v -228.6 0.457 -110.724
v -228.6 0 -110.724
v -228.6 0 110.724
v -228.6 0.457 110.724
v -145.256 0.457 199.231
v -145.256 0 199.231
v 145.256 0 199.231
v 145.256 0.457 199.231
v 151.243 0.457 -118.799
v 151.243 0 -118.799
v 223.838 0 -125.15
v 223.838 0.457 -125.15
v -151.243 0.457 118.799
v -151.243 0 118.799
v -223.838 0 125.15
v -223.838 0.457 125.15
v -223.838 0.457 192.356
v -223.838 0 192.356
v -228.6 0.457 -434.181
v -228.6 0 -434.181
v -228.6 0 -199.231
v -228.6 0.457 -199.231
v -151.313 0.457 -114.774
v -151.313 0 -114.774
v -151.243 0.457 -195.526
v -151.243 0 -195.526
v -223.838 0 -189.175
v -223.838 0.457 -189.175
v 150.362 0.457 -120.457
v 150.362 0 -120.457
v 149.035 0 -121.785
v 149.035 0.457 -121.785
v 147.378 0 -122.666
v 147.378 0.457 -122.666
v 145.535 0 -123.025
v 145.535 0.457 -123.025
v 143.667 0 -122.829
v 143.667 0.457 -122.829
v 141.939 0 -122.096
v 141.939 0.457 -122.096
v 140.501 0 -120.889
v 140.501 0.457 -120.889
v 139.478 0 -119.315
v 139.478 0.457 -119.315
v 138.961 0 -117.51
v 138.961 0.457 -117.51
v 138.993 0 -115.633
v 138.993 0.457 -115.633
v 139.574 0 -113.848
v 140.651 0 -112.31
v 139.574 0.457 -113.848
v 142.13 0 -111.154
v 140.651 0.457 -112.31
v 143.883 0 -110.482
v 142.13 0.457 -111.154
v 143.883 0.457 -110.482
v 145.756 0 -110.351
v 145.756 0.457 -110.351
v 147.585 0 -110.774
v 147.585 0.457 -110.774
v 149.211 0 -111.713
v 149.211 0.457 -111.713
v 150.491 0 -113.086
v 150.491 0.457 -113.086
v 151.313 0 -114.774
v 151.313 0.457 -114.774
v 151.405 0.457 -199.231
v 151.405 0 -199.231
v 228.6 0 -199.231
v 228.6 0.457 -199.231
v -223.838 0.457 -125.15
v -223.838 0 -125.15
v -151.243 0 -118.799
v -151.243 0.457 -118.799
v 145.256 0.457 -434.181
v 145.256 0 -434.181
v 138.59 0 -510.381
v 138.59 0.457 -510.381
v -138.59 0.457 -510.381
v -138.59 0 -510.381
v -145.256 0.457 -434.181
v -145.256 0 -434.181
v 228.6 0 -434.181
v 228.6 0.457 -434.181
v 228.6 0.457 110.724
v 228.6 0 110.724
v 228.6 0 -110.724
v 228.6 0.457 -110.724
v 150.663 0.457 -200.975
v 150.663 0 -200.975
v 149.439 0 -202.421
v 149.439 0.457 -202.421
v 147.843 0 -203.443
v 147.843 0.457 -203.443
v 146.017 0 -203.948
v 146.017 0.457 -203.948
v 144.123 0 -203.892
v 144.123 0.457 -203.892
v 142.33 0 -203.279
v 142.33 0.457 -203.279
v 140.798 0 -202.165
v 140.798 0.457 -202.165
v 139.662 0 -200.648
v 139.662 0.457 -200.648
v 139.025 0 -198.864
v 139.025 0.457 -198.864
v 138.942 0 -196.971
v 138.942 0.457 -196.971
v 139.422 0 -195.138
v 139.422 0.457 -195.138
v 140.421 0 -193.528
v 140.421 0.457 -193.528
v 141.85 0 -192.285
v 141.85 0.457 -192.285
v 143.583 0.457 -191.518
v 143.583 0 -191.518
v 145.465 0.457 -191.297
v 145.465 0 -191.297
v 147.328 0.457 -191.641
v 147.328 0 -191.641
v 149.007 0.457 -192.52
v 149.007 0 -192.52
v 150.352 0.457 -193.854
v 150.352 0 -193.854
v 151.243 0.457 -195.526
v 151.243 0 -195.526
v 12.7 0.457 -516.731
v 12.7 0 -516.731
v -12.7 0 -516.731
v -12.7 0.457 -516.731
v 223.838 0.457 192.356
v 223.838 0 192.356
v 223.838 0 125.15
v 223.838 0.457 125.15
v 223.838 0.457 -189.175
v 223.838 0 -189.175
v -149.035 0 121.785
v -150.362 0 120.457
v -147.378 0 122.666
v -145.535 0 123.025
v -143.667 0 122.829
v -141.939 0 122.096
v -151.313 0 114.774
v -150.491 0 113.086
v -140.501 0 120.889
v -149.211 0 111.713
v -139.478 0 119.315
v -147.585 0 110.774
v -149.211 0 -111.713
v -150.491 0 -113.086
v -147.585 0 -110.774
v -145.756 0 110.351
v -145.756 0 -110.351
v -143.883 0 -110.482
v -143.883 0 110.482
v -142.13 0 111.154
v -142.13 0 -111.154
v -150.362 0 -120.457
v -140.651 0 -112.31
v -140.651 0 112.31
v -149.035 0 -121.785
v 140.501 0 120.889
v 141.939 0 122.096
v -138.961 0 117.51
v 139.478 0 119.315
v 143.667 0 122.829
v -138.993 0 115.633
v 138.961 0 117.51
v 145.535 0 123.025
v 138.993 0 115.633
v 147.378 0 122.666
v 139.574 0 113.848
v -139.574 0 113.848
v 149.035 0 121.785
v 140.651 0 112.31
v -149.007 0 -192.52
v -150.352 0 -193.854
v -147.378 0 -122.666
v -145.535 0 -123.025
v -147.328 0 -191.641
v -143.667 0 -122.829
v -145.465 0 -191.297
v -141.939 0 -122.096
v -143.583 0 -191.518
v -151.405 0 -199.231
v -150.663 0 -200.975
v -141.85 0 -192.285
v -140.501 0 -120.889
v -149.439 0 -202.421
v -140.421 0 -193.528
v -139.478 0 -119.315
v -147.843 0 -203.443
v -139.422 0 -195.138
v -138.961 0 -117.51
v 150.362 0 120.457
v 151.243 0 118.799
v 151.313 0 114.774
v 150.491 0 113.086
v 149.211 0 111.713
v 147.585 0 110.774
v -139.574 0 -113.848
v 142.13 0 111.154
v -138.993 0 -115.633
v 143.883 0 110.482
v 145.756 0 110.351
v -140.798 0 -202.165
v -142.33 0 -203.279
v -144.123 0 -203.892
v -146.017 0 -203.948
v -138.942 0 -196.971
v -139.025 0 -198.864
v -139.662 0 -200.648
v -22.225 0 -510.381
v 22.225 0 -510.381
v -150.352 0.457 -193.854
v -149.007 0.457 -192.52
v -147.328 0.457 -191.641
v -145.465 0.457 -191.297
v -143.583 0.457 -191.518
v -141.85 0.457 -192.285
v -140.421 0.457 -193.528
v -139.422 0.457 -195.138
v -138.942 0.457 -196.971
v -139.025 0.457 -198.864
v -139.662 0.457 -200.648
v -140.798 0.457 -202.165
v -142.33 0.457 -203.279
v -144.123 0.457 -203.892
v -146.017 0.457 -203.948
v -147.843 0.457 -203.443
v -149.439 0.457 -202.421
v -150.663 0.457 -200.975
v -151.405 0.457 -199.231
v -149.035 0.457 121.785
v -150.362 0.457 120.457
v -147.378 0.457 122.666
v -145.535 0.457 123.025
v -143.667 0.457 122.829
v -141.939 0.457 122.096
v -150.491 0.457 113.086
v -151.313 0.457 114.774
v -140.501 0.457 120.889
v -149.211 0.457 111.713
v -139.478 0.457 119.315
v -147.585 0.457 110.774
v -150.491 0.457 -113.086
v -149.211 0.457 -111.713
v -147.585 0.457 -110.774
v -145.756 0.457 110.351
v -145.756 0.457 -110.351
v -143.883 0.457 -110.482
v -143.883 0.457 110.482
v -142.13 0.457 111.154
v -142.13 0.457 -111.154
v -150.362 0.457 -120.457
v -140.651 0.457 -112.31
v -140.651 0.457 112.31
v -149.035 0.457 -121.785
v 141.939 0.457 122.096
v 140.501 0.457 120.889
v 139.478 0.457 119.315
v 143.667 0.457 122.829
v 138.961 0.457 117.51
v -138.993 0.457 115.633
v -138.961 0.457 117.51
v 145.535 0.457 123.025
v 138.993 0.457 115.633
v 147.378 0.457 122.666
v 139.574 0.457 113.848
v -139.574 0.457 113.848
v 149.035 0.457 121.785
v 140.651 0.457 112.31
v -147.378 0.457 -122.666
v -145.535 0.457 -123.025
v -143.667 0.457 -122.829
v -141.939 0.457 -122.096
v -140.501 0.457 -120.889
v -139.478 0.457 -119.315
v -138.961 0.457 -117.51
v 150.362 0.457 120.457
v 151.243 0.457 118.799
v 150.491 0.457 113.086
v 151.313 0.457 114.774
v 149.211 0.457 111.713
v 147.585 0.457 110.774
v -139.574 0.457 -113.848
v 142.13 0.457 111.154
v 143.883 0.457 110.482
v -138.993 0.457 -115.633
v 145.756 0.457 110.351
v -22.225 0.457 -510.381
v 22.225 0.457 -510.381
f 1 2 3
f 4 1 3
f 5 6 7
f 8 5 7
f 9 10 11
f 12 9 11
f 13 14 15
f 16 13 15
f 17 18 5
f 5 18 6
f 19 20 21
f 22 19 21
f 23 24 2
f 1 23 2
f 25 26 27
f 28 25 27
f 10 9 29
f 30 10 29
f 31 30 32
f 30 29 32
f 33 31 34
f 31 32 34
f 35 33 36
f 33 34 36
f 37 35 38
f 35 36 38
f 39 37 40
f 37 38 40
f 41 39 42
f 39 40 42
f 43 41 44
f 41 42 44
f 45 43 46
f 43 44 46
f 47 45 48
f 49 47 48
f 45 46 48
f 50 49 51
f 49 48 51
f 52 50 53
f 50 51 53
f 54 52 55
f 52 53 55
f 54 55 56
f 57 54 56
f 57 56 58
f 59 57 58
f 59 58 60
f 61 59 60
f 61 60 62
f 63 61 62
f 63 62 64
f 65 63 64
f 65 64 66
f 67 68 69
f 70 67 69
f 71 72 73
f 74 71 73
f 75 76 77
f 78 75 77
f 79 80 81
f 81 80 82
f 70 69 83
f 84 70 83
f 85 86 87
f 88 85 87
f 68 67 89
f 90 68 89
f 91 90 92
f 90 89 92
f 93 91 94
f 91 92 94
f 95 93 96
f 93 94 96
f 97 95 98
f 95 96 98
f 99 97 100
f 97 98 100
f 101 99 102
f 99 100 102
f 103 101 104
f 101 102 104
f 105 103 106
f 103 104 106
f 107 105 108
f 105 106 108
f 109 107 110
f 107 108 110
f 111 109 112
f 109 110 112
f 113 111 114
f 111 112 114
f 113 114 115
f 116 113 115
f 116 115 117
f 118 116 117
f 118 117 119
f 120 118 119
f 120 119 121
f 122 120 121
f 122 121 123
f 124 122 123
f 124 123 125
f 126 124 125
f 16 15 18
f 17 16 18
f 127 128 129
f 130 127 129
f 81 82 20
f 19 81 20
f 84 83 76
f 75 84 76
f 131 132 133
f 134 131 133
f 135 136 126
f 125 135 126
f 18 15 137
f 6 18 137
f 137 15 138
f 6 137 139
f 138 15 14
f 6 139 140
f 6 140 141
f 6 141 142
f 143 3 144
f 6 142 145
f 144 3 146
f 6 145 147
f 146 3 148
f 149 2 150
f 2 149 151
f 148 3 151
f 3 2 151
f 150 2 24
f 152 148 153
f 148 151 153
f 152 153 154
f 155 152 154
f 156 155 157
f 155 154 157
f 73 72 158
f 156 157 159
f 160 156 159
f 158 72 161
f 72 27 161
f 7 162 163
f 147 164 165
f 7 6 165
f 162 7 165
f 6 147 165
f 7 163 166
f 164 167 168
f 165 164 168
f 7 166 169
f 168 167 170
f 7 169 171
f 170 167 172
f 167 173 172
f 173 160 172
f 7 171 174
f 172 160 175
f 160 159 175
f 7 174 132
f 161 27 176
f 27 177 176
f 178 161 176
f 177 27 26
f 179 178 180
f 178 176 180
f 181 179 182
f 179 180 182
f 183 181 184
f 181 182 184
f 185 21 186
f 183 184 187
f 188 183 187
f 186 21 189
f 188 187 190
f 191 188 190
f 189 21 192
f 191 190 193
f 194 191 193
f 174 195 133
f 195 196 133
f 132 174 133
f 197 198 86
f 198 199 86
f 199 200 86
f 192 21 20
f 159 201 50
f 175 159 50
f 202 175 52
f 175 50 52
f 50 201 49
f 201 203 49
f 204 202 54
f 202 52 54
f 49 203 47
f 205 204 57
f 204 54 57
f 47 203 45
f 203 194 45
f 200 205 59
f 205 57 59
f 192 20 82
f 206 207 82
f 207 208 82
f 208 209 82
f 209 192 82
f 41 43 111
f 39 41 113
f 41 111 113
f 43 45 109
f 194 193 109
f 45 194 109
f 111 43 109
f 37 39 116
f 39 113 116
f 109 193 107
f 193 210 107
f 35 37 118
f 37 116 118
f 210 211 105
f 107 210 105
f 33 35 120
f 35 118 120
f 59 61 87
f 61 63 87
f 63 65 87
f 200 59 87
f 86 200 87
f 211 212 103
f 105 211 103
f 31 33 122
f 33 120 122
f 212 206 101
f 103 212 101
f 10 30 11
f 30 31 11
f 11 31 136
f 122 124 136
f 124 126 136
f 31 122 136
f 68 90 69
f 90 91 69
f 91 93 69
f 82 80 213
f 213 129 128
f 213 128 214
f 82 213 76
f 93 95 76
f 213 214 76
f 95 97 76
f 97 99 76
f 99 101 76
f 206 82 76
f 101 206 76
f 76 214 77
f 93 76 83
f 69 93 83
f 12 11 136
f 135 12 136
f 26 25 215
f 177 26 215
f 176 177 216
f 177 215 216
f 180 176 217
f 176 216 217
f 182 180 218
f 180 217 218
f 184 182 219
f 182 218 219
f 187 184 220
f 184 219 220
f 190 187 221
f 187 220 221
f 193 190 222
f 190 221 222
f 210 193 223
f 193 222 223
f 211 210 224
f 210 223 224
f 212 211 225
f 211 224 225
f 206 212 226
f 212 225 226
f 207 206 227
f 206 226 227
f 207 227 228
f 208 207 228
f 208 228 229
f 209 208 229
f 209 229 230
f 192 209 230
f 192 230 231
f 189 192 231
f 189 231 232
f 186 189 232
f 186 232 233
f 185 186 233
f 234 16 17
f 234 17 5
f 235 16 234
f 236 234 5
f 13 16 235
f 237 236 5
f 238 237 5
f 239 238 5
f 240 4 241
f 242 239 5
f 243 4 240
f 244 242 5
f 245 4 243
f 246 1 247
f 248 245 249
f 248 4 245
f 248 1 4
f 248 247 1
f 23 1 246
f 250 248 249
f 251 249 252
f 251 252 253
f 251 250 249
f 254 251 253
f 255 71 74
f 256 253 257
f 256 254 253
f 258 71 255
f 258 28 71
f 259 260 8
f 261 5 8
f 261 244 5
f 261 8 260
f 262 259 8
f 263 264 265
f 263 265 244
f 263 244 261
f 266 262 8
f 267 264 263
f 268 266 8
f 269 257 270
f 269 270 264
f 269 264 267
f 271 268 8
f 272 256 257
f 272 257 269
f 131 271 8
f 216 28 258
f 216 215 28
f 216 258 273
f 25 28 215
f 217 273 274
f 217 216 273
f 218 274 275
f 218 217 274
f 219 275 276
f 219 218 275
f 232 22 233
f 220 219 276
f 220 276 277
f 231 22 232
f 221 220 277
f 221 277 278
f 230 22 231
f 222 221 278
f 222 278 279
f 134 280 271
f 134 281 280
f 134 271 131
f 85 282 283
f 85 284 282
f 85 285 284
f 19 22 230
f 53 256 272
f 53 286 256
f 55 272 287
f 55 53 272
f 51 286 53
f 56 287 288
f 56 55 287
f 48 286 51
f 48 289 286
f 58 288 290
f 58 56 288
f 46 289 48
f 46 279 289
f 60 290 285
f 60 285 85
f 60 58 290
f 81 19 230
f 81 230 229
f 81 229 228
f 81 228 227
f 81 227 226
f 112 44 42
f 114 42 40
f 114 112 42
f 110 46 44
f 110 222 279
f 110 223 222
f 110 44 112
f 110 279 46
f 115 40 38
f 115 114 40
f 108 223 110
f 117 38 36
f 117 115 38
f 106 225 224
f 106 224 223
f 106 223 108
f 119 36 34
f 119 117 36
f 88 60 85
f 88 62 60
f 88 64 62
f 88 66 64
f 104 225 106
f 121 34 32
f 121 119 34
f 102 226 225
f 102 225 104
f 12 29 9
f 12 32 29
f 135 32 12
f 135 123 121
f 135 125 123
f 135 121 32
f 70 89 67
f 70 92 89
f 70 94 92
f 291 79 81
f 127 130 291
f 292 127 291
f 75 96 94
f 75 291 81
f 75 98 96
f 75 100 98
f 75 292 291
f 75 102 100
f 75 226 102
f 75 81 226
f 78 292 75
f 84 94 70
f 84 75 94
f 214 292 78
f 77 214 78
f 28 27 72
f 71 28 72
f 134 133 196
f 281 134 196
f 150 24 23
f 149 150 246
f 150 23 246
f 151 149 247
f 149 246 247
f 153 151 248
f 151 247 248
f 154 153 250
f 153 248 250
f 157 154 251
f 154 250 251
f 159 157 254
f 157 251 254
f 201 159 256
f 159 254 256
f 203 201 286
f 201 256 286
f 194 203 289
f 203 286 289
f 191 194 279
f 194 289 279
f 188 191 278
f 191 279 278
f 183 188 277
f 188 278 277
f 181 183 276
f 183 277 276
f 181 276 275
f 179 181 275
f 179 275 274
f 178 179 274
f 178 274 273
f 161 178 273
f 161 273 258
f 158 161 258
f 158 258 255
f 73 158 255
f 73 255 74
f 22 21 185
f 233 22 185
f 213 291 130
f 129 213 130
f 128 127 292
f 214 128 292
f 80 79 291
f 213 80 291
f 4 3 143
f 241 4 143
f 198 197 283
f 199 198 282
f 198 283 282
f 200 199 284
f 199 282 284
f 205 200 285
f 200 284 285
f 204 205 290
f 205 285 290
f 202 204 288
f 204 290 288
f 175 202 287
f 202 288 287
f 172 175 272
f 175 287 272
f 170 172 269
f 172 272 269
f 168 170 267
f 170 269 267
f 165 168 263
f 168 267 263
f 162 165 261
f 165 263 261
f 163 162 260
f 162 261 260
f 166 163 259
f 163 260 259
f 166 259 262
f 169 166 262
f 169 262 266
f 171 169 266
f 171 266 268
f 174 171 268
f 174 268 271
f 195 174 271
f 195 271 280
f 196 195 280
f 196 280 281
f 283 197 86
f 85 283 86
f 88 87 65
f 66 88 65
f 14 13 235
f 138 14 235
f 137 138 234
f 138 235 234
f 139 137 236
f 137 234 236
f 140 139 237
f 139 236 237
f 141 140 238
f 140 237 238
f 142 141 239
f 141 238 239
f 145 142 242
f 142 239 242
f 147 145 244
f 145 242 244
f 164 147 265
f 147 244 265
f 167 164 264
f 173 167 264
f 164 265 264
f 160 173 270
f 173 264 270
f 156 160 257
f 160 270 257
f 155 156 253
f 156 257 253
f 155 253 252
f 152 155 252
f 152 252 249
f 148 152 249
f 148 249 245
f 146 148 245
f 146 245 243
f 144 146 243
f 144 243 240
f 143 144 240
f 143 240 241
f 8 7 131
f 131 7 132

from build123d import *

# Parameters (mm, degrees)
EXTRUDE1_DEPTH = 0.4572
EXTRUDE2_REACH = 567.039
SKETCH2_R      = 6.35
EXTRUDE3_REACH = 567.039


with BuildPart() as part:
    # Sketch1 → Extrude1 (new body)
    with BuildSketch(Plane(origin=(0, 0, 0), x_dir=(1, 0, 0), z_dir=(0, 1, 0))):
        with BuildLine():
            Line((145.25625, 434.18125), (138.034060826, 516.73125))
            Line((138.034060826, 516.73125), (-138.034060826, 516.73125))
            Line((-138.034060826, 516.73125), (-145.25625, 434.18125))
            Line((-145.25625, 434.18125), (-228.6, 434.18125))
            Line((-228.6, 434.18125), (-228.6, 199.23125))
            Line((-228.6, 199.23125), (-145.25625, 199.23125))
            ThreePointArc((-145.25625, 199.23125), (-143.670260948, 197.712995777), (-145.117890258, 196.062290917))
            Line((-145.117890258, 196.062290917), (-223.8375, 189.175217467))
            Line((-223.8375, 189.175217467), (-223.8375, 125.149782533))
            Line((-223.8375, 125.149782533), (-145.117890258, 118.262709083))
            ThreePointArc((-145.117890258, 118.262709083), (-143.668991784, 116.653544305), (-145.173166669, 115.095925614))
            Line((-145.173166669, 115.095925614), (-228.6, 110.723710546))
            Line((-228.6, 110.723710546), (-228.6, -110.723710546))
            Line((-228.6, -110.723710546), (-145.173166669, -115.095925614))
            ThreePointArc((-145.173166669, -115.095925614), (-143.668991784, -116.653544305), (-145.117890258, -118.262709083))
            Line((-145.117890258, -118.262709083), (-223.8375, -125.149782533))
            Line((-223.8375, -125.149782533), (-223.8375, -192.356281459))
            Line((-223.8375, -192.356281459), (-145.25625, -199.23125))
            Line((-145.25625, -199.23125), (145.25625, -199.23125))
            Line((145.25625, -199.23125), (223.8375, -192.356281459))
            Line((223.8375, -192.356281459), (223.8375, -125.149782533))
            Line((223.8375, -125.149782533), (145.117890258, -118.262709083))
            ThreePointArc((145.117890258, -118.262709083), (143.668991784, -116.653544305), (145.173166669, -115.095925614))
            Line((145.173166669, -115.095925614), (228.6, -110.723710546))
            Line((228.6, -110.723710546), (228.6, 110.723710546))
            Line((228.6, 110.723710546), (145.173166669, 115.095925614))
            ThreePointArc((145.173166669, 115.095925614), (143.668991784, 116.653544305), (145.117890258, 118.262709083))
            Line((145.117890258, 118.262709083), (223.8375, 125.149782533))
            Line((223.8375, 125.149782533), (223.8375, 189.175217467))
            Line((223.8375, 189.175217467), (145.117890258, 196.062290917))
            ThreePointArc((145.117890258, 196.062290917), (143.670260948, 197.712995777), (145.25625, 199.23125))
            Line((145.25625, 199.23125), (228.6, 199.23125))
            Line((228.6, 199.23125), (228.6, 434.18125))
            Line((228.6, 434.18125), (145.25625, 434.18125))
        make_face()
    extrude(amount=EXTRUDE1_DEPTH)

    # Sketch2 → Extrude2 (cut, up to next)
    with BuildSketch(Plane(origin=(0, 0.4572, 0), x_dir=(1, 0, 0), z_dir=(0, 1, 0)), mode=Mode.PRIVATE) as extrude2_sk1:
        with Locations((-145.25625, 116.68125)):
            Circle(SKETCH2_R)
    extrude2_tool1 = extrude(extrude2_sk1.sketch, amount=-EXTRUDE2_REACH, mode=Mode.PRIVATE) & part.part
    # Sketch2 → Extrude2 (cut, up to next)
    with BuildSketch(Plane(origin=(0, 0.4572, 0), x_dir=(1, 0, 0), z_dir=(0, 1, 0)), mode=Mode.PRIVATE) as extrude2_sk2:
        with Locations((-145.25625, -116.68125)):
            Circle(SKETCH2_R)
    extrude2_tool2 = extrude(extrude2_sk2.sketch, amount=-EXTRUDE2_REACH, mode=Mode.PRIVATE) & part.part
    # Sketch2 → Extrude2 (cut, up to next)
    with BuildSketch(Plane(origin=(0, 0.4572, 0), x_dir=(1, 0, 0), z_dir=(0, 1, 0)), mode=Mode.PRIVATE) as extrude2_sk3:
        with Locations((145.25625, -116.68125)):
            Circle(SKETCH2_R)
    extrude2_tool3 = extrude(extrude2_sk3.sketch, amount=-EXTRUDE2_REACH, mode=Mode.PRIVATE) & part.part
    # Sketch2 → Extrude2 (cut, up to next)
    with BuildSketch(Plane(origin=(0, 0.4572, 0), x_dir=(1, 0, 0), z_dir=(0, 1, 0)), mode=Mode.PRIVATE) as extrude2_sk4:
        with Locations((145.25625, 116.68125)):
            Circle(SKETCH2_R)
    extrude2_tool4 = extrude(extrude2_sk4.sketch, amount=-EXTRUDE2_REACH, mode=Mode.PRIVATE) & part.part
    # Sketch2 → Extrude2 (cut, up to next)
    with BuildSketch(Plane(origin=(0, 0.4572, 0), x_dir=(1, 0, 0), z_dir=(0, 1, 0)), mode=Mode.PRIVATE) as extrude2_sk5:
        with Locations((-145.25625, 197.64375)):
            Circle(SKETCH2_R)
    extrude2_tool5 = extrude(extrude2_sk5.sketch, amount=-EXTRUDE2_REACH, mode=Mode.PRIVATE) & part.part
    # Sketch2 → Extrude2 (cut, up to next)
    with BuildSketch(Plane(origin=(0, 0.4572, 0), x_dir=(1, 0, 0), z_dir=(0, 1, 0)), mode=Mode.PRIVATE) as extrude2_sk6:
        with Locations((145.25625, 197.64375)):
            Circle(SKETCH2_R)
    extrude2_tool6 = extrude(extrude2_sk6.sketch, amount=-EXTRUDE2_REACH, mode=Mode.PRIVATE) & part.part
    add(extrude2_tool1.solids().sort_by_distance((-145.25625, 0.4572, -116.68125))[0], mode=Mode.SUBTRACT)
    add(extrude2_tool2.solids().sort_by_distance((-145.25625, 0.4572, 116.68125))[0], mode=Mode.SUBTRACT)
    add(extrude2_tool3.solids().sort_by_distance((145.25625, 0.4572, 116.68125))[0], mode=Mode.SUBTRACT)
    add(extrude2_tool4.solids().sort_by_distance((145.25625, 0.4572, -116.68125))[0], mode=Mode.SUBTRACT)
    add(extrude2_tool5.solids().sort_by_distance((-145.25625, 0.4572, -197.64375))[0], mode=Mode.SUBTRACT)
    add(extrude2_tool6.solids().sort_by_distance((145.25625, 0.4572, -197.64375))[0], mode=Mode.SUBTRACT)

    # Sketch12 → Extrude3 (cut, up to next)
    with BuildSketch(Plane(origin=(0, 0.4572, 0), x_dir=(1, 0, 0), z_dir=(0, 1, 0)), mode=Mode.PRIVATE) as extrude3_sk1:
        Polygon((-138.589613839, 510.38125), (-22.225, 510.38125), (-12.7, 516.73125), (-138.034060826, 516.73125), align=None)
    extrude3_tool1 = extrude(extrude3_sk1.sketch, amount=-EXTRUDE3_REACH, mode=Mode.PRIVATE) & part.part
    # Sketch12 → Extrude3 (cut, up to next)
    with BuildSketch(Plane(origin=(0, 0.4572, 0), x_dir=(1, 0, 0), z_dir=(0, 1, 0)), mode=Mode.PRIVATE) as extrude3_sk2:
        Polygon((12.7, 516.73125), (22.225, 510.38125), (138.589613839, 510.38125), (138.034060826, 516.73125), align=None)
    extrude3_tool2 = extrude(extrude3_sk2.sketch, amount=-EXTRUDE3_REACH, mode=Mode.PRIVATE) & part.part
    add(extrude3_tool1.solids().sort_by_distance((-77.855995, 0.4572, -513.595525))[0], mode=Mode.SUBTRACT)
    add(extrude3_tool2.solids().sort_by_distance((77.855995, 0.4572, -513.595525))[0], mode=Mode.SUBTRACT)


solid = part.part
